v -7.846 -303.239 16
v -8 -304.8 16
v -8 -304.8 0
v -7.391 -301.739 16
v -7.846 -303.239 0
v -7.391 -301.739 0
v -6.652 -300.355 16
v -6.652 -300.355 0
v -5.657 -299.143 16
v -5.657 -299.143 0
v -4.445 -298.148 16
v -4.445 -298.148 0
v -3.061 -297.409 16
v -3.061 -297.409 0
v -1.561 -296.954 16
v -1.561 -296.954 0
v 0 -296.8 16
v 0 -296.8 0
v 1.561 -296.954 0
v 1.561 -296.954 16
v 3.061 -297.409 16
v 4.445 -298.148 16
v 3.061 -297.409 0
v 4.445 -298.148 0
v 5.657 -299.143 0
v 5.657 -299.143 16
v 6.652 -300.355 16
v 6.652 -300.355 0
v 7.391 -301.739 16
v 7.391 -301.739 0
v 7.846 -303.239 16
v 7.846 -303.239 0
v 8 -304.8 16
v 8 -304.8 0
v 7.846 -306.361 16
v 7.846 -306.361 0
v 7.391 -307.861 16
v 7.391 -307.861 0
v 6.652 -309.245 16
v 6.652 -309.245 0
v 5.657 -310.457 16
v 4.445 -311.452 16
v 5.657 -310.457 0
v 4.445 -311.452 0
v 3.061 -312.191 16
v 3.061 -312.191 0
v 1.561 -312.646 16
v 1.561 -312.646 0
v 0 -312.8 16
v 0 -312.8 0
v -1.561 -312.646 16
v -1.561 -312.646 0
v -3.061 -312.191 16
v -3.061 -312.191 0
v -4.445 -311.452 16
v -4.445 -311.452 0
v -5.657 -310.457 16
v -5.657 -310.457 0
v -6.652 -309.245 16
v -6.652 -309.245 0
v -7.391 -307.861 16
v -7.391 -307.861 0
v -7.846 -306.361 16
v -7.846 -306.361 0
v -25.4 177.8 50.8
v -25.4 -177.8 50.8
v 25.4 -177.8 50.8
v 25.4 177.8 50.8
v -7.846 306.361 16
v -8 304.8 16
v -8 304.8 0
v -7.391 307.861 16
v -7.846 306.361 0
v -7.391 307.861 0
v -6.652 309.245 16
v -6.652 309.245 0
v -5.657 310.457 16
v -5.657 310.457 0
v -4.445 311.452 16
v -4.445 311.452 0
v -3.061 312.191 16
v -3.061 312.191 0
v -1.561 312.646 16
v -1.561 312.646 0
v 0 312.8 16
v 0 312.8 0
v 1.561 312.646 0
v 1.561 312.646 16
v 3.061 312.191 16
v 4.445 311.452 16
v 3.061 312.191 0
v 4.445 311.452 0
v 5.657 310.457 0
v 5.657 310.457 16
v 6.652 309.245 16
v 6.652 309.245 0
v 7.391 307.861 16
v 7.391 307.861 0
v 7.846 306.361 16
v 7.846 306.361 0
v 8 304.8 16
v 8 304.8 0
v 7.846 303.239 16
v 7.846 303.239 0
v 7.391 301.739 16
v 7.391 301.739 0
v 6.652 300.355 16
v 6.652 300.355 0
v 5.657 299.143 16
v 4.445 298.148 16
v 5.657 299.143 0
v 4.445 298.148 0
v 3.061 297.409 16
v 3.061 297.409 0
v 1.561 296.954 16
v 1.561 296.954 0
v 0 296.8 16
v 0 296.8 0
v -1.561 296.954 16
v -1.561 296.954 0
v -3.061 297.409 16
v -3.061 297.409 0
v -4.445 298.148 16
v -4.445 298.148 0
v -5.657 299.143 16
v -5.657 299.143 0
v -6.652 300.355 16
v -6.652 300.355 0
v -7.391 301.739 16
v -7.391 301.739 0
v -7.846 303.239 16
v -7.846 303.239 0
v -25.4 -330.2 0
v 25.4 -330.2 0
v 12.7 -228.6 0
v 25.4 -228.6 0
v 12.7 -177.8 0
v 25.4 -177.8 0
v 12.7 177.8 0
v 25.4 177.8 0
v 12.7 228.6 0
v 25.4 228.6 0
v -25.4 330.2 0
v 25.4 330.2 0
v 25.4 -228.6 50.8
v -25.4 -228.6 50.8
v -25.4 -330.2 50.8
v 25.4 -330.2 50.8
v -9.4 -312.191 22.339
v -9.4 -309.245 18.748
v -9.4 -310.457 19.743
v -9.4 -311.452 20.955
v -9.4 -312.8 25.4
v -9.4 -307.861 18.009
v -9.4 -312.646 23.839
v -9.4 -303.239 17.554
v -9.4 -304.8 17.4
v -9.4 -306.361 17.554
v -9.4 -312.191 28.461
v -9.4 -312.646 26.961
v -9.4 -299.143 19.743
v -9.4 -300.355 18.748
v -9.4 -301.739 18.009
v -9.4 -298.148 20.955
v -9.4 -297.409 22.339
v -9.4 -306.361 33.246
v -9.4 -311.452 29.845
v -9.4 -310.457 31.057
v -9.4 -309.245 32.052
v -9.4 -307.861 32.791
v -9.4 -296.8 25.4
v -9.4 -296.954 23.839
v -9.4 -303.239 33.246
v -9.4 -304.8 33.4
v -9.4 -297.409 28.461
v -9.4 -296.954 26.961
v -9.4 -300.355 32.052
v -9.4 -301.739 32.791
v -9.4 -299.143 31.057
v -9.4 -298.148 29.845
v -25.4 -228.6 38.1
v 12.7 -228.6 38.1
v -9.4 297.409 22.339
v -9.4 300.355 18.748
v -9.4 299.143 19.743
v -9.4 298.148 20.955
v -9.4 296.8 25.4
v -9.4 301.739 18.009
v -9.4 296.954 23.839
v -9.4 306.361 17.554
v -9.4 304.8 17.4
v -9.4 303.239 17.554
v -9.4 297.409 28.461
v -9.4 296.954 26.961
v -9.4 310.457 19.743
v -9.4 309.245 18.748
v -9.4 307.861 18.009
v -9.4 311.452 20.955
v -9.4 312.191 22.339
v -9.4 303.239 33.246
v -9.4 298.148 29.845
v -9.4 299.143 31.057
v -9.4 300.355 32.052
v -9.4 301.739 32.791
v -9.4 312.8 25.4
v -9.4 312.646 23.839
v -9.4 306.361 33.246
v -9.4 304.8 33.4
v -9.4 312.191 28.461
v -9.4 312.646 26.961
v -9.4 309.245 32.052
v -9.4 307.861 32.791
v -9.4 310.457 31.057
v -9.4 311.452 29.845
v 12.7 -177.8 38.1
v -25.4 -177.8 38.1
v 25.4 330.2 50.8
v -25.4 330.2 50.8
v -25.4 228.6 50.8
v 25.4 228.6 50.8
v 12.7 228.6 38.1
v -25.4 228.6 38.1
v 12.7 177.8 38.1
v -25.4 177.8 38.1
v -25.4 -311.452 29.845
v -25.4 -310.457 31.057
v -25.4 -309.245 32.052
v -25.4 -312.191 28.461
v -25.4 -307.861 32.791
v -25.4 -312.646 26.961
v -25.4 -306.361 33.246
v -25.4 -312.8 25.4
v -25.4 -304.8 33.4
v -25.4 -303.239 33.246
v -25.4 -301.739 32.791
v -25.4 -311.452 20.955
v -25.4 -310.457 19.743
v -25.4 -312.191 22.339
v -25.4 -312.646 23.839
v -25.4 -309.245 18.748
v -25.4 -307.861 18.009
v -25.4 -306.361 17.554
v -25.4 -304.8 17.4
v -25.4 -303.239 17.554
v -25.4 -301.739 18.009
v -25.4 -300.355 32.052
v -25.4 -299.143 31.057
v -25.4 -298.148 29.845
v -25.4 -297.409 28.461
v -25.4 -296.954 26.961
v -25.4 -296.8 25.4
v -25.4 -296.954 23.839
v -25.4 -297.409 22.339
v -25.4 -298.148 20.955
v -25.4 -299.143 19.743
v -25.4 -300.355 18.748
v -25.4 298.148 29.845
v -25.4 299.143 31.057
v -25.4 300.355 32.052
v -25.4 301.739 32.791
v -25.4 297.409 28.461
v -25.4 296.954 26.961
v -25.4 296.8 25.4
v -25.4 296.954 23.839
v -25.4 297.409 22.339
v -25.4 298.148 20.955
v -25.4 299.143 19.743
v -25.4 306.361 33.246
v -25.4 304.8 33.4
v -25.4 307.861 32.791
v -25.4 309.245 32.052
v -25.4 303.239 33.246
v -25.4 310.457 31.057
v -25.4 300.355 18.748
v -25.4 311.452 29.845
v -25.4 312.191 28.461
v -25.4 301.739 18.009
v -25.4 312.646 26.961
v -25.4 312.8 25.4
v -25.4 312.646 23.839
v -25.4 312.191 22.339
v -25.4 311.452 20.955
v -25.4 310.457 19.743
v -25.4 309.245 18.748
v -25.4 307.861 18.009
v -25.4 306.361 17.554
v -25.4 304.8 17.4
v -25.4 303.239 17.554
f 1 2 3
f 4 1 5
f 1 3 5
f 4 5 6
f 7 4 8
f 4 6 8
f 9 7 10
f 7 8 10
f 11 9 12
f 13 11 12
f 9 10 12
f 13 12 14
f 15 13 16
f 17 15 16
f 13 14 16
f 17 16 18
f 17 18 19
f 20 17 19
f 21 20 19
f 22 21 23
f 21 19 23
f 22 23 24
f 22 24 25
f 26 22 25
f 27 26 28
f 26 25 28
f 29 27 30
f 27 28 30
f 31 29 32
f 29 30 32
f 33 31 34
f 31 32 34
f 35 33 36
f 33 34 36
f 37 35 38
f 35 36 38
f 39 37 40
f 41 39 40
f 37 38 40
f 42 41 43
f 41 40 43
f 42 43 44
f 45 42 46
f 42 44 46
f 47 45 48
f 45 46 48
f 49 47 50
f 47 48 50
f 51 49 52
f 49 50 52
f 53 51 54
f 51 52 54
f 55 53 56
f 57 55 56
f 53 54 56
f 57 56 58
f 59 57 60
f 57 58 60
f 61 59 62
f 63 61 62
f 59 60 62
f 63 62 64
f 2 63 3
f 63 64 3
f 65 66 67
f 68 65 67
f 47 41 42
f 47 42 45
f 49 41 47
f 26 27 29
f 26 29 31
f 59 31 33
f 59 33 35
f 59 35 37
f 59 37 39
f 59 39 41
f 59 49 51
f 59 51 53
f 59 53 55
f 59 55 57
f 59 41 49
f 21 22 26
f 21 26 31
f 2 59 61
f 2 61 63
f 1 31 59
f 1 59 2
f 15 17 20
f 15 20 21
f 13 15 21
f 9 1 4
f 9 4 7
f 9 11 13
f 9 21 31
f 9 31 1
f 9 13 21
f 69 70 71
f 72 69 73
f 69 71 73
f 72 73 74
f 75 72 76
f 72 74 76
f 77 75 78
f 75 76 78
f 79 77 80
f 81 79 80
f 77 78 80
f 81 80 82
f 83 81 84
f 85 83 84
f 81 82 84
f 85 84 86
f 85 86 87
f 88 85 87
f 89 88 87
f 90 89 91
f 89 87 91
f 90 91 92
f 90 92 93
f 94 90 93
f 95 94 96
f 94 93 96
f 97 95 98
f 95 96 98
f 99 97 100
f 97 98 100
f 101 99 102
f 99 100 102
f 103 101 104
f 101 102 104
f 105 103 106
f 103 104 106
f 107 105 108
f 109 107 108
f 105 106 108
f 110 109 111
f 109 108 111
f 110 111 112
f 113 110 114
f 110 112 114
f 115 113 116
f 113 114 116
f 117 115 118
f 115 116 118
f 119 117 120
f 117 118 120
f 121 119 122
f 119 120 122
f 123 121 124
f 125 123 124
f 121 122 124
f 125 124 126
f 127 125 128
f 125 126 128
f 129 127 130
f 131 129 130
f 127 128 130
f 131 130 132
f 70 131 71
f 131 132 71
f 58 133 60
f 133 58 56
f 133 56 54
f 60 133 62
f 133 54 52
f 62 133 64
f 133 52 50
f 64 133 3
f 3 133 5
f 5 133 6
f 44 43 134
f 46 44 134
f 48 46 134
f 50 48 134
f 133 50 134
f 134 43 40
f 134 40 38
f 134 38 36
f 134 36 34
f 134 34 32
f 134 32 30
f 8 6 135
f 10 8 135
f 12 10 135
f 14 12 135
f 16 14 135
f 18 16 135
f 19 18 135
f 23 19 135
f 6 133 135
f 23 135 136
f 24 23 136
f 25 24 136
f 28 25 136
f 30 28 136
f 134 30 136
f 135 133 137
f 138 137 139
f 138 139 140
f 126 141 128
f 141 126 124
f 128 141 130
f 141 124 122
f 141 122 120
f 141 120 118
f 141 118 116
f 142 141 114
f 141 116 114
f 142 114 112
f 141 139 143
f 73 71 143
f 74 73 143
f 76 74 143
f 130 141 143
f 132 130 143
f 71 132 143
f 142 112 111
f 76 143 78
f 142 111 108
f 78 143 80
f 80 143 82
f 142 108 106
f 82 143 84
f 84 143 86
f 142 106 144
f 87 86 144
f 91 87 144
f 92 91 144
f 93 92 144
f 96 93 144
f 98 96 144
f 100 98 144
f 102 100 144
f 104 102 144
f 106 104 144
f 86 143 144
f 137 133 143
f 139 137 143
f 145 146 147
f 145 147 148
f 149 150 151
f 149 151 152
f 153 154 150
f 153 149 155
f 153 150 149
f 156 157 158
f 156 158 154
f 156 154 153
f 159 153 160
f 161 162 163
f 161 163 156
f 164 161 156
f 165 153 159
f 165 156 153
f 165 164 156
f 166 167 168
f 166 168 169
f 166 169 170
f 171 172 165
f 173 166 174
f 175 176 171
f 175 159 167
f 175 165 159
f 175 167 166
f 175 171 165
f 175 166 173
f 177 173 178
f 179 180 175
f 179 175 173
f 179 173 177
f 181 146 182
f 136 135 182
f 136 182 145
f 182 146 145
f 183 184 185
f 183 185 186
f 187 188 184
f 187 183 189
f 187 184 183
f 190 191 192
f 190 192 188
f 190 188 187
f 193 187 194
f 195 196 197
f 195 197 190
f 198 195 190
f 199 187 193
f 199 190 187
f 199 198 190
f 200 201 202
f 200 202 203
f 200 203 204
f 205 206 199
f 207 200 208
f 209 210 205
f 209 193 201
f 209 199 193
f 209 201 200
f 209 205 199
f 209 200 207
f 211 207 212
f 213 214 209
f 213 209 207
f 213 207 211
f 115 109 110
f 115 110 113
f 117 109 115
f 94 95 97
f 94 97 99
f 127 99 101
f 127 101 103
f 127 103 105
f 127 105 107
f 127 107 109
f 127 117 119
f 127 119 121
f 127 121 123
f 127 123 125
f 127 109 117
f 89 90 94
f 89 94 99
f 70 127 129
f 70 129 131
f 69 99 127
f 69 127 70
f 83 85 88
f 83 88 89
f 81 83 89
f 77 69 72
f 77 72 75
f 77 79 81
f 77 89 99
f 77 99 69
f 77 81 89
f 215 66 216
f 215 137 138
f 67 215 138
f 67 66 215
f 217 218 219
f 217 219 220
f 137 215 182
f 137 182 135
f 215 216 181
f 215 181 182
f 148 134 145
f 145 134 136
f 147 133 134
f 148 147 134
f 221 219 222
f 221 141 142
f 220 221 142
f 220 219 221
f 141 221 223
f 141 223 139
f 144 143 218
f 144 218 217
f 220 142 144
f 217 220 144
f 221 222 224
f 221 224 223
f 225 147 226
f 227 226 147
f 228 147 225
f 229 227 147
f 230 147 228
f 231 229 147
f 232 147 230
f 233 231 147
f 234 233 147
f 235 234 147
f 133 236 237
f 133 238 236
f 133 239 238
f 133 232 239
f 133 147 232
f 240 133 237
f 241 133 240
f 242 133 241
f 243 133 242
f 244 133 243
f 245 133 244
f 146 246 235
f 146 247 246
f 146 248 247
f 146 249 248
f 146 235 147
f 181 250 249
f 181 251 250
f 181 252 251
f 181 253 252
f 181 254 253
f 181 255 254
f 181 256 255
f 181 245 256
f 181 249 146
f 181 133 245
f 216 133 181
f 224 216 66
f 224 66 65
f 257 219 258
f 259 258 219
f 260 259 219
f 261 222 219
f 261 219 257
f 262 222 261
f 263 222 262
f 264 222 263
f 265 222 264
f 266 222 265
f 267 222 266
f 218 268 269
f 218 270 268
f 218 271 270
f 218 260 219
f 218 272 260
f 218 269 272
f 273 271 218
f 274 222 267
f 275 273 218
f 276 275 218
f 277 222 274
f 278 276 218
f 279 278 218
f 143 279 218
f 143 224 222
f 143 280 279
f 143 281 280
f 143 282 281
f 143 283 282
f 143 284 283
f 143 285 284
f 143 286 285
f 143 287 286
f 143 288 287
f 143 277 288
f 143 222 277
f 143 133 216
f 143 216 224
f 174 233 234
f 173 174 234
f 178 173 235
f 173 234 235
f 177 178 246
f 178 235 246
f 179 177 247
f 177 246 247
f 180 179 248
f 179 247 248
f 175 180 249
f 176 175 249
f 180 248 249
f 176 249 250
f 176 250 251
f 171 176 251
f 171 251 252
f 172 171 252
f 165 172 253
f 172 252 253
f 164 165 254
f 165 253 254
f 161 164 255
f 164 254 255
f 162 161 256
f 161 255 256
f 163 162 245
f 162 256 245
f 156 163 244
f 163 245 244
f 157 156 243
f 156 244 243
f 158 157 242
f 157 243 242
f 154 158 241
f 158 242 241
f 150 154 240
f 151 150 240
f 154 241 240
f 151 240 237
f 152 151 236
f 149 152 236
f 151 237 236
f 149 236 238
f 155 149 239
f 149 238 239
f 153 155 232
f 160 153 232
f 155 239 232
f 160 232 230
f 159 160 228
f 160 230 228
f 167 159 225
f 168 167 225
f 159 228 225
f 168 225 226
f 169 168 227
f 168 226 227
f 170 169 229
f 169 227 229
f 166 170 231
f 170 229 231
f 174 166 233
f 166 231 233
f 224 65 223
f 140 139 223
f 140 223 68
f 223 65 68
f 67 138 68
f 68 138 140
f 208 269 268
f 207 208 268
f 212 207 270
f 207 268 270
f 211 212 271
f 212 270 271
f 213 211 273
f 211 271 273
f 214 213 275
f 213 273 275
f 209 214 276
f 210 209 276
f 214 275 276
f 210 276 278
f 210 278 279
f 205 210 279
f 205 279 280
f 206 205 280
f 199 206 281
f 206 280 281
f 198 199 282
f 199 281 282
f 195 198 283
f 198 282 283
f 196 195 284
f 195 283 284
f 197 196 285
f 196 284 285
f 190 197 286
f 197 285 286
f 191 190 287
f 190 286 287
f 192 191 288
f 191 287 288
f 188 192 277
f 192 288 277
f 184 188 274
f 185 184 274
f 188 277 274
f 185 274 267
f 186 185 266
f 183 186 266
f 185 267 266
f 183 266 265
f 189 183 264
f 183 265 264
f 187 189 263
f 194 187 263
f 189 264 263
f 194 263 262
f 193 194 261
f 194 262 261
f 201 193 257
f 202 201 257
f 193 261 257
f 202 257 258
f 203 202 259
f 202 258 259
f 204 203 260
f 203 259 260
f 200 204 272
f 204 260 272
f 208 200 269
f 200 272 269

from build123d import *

# Parameters (mm, degrees)
SKETCH2_W           = 50.8
SKETCH2_H           = 660.4
BOSS_EXTRUDE1_DEPTH = 50.8
SKETCH5_W           = 50.8
SKETCH5_H           = 50.8
CUT_EXTRUDE1_DEPTH  = 12.7
SKETCH6_W           = 50.8
SKETCH6_H           = 50.8
CUT_EXTRUDE2_DEPTH  = 12.7
SKETCH10_W          = 50.8
SKETCH10_H          = 50.8
CUT_EXTRUDE3_DEPTH  = 12.7
SKETCH11_W          = 50.8
SKETCH11_H          = 50.8
CUT_EXTRUDE4_DEPTH  = 12.7
SKETCH12_R          = 8
CUT_EXTRUDE5_DEPTH  = 16
SKETCH13_R          = 8
CUT_EXTRUDE6_DEPTH  = 16
SKETCH14_R          = 8
CUT_EXTRUDE7_DEPTH  = 16
SKETCH15_R          = 8
CUT_EXTRUDE8_DEPTH  = 16


with BuildPart() as part:
    # Sketch2 → Boss-Extrude1 (new body)
    with BuildSketch(Plane.XY):
        Rectangle(SKETCH2_W, SKETCH2_H)
    extrude(amount=BOSS_EXTRUDE1_DEPTH)

    # Sketch5 → Cut-Extrude1 (cut)
    with BuildSketch(Plane.XY.offset(50.8)):
        with Locations((0, 203.2)):
            Rectangle(SKETCH5_W, SKETCH5_H)
    extrude(amount=-CUT_EXTRUDE1_DEPTH, mode=Mode.SUBTRACT)

    # Sketch6 → Cut-Extrude2 (cut)
    with BuildSketch(Plane(origin=(25.4, 0, 0), x_dir=(0, 0, -1), z_dir=(1, 0, 0))):
        with Locations((-25.4, 203.2)):
            Rectangle(SKETCH6_W, SKETCH6_H)
    extrude(amount=-CUT_EXTRUDE2_DEPTH, mode=Mode.SUBTRACT)

    # Sketch10 → Cut-Extrude3 (cut)
    with BuildSketch(Plane.XY.offset(50.8)):
        with Locations((0, -203.2)):
            Rectangle(SKETCH10_W, SKETCH10_H)
    extrude(amount=-CUT_EXTRUDE3_DEPTH, mode=Mode.SUBTRACT)

    # Sketch11 → Cut-Extrude4 (cut)
    with BuildSketch(Plane(origin=(25.4, 0, 0), x_dir=(0, 0, -1), z_dir=(1, 0, 0))):
        with Locations((-25.4, -203.2)):
            Rectangle(SKETCH11_W, SKETCH11_H)
    extrude(amount=-CUT_EXTRUDE4_DEPTH, mode=Mode.SUBTRACT)

    # Sketch12 → Cut-Extrude5 (cut)
    with BuildSketch(Plane(origin=(0, 0, 0), x_dir=(-1, 0, 0), z_dir=(0, 0, -1))):
        with Locations((0, 304.8)):
            Circle(SKETCH12_R)
    extrude(amount=-CUT_EXTRUDE5_DEPTH, mode=Mode.SUBTRACT)

    # Sketch13 → Cut-Extrude6 (cut)
    with BuildSketch(Plane.ZY.offset(25.4)):
        with Locations((25.4, 304.8)):
            Circle(SKETCH13_R)
    extrude(amount=-CUT_EXTRUDE6_DEPTH, mode=Mode.SUBTRACT)

    # Sketch14 → Cut-Extrude7 (cut)
    with BuildSketch(Plane(origin=(0, 0, 0), x_dir=(-1, 0, 0), z_dir=(0, 0, -1))):
        with Locations((0, -304.8)):
            Circle(SKETCH14_R)
    extrude(amount=-CUT_EXTRUDE7_DEPTH, mode=Mode.SUBTRACT)

    # Sketch15 → Cut-Extrude8 (cut)
    with BuildSketch(Plane.ZY.offset(25.4)):
        with Locations((25.4, -304.8)):
            Circle(SKETCH15_R)
    extrude(amount=-CUT_EXTRUDE8_DEPTH, mode=Mode.SUBTRACT)


solid = part.part
